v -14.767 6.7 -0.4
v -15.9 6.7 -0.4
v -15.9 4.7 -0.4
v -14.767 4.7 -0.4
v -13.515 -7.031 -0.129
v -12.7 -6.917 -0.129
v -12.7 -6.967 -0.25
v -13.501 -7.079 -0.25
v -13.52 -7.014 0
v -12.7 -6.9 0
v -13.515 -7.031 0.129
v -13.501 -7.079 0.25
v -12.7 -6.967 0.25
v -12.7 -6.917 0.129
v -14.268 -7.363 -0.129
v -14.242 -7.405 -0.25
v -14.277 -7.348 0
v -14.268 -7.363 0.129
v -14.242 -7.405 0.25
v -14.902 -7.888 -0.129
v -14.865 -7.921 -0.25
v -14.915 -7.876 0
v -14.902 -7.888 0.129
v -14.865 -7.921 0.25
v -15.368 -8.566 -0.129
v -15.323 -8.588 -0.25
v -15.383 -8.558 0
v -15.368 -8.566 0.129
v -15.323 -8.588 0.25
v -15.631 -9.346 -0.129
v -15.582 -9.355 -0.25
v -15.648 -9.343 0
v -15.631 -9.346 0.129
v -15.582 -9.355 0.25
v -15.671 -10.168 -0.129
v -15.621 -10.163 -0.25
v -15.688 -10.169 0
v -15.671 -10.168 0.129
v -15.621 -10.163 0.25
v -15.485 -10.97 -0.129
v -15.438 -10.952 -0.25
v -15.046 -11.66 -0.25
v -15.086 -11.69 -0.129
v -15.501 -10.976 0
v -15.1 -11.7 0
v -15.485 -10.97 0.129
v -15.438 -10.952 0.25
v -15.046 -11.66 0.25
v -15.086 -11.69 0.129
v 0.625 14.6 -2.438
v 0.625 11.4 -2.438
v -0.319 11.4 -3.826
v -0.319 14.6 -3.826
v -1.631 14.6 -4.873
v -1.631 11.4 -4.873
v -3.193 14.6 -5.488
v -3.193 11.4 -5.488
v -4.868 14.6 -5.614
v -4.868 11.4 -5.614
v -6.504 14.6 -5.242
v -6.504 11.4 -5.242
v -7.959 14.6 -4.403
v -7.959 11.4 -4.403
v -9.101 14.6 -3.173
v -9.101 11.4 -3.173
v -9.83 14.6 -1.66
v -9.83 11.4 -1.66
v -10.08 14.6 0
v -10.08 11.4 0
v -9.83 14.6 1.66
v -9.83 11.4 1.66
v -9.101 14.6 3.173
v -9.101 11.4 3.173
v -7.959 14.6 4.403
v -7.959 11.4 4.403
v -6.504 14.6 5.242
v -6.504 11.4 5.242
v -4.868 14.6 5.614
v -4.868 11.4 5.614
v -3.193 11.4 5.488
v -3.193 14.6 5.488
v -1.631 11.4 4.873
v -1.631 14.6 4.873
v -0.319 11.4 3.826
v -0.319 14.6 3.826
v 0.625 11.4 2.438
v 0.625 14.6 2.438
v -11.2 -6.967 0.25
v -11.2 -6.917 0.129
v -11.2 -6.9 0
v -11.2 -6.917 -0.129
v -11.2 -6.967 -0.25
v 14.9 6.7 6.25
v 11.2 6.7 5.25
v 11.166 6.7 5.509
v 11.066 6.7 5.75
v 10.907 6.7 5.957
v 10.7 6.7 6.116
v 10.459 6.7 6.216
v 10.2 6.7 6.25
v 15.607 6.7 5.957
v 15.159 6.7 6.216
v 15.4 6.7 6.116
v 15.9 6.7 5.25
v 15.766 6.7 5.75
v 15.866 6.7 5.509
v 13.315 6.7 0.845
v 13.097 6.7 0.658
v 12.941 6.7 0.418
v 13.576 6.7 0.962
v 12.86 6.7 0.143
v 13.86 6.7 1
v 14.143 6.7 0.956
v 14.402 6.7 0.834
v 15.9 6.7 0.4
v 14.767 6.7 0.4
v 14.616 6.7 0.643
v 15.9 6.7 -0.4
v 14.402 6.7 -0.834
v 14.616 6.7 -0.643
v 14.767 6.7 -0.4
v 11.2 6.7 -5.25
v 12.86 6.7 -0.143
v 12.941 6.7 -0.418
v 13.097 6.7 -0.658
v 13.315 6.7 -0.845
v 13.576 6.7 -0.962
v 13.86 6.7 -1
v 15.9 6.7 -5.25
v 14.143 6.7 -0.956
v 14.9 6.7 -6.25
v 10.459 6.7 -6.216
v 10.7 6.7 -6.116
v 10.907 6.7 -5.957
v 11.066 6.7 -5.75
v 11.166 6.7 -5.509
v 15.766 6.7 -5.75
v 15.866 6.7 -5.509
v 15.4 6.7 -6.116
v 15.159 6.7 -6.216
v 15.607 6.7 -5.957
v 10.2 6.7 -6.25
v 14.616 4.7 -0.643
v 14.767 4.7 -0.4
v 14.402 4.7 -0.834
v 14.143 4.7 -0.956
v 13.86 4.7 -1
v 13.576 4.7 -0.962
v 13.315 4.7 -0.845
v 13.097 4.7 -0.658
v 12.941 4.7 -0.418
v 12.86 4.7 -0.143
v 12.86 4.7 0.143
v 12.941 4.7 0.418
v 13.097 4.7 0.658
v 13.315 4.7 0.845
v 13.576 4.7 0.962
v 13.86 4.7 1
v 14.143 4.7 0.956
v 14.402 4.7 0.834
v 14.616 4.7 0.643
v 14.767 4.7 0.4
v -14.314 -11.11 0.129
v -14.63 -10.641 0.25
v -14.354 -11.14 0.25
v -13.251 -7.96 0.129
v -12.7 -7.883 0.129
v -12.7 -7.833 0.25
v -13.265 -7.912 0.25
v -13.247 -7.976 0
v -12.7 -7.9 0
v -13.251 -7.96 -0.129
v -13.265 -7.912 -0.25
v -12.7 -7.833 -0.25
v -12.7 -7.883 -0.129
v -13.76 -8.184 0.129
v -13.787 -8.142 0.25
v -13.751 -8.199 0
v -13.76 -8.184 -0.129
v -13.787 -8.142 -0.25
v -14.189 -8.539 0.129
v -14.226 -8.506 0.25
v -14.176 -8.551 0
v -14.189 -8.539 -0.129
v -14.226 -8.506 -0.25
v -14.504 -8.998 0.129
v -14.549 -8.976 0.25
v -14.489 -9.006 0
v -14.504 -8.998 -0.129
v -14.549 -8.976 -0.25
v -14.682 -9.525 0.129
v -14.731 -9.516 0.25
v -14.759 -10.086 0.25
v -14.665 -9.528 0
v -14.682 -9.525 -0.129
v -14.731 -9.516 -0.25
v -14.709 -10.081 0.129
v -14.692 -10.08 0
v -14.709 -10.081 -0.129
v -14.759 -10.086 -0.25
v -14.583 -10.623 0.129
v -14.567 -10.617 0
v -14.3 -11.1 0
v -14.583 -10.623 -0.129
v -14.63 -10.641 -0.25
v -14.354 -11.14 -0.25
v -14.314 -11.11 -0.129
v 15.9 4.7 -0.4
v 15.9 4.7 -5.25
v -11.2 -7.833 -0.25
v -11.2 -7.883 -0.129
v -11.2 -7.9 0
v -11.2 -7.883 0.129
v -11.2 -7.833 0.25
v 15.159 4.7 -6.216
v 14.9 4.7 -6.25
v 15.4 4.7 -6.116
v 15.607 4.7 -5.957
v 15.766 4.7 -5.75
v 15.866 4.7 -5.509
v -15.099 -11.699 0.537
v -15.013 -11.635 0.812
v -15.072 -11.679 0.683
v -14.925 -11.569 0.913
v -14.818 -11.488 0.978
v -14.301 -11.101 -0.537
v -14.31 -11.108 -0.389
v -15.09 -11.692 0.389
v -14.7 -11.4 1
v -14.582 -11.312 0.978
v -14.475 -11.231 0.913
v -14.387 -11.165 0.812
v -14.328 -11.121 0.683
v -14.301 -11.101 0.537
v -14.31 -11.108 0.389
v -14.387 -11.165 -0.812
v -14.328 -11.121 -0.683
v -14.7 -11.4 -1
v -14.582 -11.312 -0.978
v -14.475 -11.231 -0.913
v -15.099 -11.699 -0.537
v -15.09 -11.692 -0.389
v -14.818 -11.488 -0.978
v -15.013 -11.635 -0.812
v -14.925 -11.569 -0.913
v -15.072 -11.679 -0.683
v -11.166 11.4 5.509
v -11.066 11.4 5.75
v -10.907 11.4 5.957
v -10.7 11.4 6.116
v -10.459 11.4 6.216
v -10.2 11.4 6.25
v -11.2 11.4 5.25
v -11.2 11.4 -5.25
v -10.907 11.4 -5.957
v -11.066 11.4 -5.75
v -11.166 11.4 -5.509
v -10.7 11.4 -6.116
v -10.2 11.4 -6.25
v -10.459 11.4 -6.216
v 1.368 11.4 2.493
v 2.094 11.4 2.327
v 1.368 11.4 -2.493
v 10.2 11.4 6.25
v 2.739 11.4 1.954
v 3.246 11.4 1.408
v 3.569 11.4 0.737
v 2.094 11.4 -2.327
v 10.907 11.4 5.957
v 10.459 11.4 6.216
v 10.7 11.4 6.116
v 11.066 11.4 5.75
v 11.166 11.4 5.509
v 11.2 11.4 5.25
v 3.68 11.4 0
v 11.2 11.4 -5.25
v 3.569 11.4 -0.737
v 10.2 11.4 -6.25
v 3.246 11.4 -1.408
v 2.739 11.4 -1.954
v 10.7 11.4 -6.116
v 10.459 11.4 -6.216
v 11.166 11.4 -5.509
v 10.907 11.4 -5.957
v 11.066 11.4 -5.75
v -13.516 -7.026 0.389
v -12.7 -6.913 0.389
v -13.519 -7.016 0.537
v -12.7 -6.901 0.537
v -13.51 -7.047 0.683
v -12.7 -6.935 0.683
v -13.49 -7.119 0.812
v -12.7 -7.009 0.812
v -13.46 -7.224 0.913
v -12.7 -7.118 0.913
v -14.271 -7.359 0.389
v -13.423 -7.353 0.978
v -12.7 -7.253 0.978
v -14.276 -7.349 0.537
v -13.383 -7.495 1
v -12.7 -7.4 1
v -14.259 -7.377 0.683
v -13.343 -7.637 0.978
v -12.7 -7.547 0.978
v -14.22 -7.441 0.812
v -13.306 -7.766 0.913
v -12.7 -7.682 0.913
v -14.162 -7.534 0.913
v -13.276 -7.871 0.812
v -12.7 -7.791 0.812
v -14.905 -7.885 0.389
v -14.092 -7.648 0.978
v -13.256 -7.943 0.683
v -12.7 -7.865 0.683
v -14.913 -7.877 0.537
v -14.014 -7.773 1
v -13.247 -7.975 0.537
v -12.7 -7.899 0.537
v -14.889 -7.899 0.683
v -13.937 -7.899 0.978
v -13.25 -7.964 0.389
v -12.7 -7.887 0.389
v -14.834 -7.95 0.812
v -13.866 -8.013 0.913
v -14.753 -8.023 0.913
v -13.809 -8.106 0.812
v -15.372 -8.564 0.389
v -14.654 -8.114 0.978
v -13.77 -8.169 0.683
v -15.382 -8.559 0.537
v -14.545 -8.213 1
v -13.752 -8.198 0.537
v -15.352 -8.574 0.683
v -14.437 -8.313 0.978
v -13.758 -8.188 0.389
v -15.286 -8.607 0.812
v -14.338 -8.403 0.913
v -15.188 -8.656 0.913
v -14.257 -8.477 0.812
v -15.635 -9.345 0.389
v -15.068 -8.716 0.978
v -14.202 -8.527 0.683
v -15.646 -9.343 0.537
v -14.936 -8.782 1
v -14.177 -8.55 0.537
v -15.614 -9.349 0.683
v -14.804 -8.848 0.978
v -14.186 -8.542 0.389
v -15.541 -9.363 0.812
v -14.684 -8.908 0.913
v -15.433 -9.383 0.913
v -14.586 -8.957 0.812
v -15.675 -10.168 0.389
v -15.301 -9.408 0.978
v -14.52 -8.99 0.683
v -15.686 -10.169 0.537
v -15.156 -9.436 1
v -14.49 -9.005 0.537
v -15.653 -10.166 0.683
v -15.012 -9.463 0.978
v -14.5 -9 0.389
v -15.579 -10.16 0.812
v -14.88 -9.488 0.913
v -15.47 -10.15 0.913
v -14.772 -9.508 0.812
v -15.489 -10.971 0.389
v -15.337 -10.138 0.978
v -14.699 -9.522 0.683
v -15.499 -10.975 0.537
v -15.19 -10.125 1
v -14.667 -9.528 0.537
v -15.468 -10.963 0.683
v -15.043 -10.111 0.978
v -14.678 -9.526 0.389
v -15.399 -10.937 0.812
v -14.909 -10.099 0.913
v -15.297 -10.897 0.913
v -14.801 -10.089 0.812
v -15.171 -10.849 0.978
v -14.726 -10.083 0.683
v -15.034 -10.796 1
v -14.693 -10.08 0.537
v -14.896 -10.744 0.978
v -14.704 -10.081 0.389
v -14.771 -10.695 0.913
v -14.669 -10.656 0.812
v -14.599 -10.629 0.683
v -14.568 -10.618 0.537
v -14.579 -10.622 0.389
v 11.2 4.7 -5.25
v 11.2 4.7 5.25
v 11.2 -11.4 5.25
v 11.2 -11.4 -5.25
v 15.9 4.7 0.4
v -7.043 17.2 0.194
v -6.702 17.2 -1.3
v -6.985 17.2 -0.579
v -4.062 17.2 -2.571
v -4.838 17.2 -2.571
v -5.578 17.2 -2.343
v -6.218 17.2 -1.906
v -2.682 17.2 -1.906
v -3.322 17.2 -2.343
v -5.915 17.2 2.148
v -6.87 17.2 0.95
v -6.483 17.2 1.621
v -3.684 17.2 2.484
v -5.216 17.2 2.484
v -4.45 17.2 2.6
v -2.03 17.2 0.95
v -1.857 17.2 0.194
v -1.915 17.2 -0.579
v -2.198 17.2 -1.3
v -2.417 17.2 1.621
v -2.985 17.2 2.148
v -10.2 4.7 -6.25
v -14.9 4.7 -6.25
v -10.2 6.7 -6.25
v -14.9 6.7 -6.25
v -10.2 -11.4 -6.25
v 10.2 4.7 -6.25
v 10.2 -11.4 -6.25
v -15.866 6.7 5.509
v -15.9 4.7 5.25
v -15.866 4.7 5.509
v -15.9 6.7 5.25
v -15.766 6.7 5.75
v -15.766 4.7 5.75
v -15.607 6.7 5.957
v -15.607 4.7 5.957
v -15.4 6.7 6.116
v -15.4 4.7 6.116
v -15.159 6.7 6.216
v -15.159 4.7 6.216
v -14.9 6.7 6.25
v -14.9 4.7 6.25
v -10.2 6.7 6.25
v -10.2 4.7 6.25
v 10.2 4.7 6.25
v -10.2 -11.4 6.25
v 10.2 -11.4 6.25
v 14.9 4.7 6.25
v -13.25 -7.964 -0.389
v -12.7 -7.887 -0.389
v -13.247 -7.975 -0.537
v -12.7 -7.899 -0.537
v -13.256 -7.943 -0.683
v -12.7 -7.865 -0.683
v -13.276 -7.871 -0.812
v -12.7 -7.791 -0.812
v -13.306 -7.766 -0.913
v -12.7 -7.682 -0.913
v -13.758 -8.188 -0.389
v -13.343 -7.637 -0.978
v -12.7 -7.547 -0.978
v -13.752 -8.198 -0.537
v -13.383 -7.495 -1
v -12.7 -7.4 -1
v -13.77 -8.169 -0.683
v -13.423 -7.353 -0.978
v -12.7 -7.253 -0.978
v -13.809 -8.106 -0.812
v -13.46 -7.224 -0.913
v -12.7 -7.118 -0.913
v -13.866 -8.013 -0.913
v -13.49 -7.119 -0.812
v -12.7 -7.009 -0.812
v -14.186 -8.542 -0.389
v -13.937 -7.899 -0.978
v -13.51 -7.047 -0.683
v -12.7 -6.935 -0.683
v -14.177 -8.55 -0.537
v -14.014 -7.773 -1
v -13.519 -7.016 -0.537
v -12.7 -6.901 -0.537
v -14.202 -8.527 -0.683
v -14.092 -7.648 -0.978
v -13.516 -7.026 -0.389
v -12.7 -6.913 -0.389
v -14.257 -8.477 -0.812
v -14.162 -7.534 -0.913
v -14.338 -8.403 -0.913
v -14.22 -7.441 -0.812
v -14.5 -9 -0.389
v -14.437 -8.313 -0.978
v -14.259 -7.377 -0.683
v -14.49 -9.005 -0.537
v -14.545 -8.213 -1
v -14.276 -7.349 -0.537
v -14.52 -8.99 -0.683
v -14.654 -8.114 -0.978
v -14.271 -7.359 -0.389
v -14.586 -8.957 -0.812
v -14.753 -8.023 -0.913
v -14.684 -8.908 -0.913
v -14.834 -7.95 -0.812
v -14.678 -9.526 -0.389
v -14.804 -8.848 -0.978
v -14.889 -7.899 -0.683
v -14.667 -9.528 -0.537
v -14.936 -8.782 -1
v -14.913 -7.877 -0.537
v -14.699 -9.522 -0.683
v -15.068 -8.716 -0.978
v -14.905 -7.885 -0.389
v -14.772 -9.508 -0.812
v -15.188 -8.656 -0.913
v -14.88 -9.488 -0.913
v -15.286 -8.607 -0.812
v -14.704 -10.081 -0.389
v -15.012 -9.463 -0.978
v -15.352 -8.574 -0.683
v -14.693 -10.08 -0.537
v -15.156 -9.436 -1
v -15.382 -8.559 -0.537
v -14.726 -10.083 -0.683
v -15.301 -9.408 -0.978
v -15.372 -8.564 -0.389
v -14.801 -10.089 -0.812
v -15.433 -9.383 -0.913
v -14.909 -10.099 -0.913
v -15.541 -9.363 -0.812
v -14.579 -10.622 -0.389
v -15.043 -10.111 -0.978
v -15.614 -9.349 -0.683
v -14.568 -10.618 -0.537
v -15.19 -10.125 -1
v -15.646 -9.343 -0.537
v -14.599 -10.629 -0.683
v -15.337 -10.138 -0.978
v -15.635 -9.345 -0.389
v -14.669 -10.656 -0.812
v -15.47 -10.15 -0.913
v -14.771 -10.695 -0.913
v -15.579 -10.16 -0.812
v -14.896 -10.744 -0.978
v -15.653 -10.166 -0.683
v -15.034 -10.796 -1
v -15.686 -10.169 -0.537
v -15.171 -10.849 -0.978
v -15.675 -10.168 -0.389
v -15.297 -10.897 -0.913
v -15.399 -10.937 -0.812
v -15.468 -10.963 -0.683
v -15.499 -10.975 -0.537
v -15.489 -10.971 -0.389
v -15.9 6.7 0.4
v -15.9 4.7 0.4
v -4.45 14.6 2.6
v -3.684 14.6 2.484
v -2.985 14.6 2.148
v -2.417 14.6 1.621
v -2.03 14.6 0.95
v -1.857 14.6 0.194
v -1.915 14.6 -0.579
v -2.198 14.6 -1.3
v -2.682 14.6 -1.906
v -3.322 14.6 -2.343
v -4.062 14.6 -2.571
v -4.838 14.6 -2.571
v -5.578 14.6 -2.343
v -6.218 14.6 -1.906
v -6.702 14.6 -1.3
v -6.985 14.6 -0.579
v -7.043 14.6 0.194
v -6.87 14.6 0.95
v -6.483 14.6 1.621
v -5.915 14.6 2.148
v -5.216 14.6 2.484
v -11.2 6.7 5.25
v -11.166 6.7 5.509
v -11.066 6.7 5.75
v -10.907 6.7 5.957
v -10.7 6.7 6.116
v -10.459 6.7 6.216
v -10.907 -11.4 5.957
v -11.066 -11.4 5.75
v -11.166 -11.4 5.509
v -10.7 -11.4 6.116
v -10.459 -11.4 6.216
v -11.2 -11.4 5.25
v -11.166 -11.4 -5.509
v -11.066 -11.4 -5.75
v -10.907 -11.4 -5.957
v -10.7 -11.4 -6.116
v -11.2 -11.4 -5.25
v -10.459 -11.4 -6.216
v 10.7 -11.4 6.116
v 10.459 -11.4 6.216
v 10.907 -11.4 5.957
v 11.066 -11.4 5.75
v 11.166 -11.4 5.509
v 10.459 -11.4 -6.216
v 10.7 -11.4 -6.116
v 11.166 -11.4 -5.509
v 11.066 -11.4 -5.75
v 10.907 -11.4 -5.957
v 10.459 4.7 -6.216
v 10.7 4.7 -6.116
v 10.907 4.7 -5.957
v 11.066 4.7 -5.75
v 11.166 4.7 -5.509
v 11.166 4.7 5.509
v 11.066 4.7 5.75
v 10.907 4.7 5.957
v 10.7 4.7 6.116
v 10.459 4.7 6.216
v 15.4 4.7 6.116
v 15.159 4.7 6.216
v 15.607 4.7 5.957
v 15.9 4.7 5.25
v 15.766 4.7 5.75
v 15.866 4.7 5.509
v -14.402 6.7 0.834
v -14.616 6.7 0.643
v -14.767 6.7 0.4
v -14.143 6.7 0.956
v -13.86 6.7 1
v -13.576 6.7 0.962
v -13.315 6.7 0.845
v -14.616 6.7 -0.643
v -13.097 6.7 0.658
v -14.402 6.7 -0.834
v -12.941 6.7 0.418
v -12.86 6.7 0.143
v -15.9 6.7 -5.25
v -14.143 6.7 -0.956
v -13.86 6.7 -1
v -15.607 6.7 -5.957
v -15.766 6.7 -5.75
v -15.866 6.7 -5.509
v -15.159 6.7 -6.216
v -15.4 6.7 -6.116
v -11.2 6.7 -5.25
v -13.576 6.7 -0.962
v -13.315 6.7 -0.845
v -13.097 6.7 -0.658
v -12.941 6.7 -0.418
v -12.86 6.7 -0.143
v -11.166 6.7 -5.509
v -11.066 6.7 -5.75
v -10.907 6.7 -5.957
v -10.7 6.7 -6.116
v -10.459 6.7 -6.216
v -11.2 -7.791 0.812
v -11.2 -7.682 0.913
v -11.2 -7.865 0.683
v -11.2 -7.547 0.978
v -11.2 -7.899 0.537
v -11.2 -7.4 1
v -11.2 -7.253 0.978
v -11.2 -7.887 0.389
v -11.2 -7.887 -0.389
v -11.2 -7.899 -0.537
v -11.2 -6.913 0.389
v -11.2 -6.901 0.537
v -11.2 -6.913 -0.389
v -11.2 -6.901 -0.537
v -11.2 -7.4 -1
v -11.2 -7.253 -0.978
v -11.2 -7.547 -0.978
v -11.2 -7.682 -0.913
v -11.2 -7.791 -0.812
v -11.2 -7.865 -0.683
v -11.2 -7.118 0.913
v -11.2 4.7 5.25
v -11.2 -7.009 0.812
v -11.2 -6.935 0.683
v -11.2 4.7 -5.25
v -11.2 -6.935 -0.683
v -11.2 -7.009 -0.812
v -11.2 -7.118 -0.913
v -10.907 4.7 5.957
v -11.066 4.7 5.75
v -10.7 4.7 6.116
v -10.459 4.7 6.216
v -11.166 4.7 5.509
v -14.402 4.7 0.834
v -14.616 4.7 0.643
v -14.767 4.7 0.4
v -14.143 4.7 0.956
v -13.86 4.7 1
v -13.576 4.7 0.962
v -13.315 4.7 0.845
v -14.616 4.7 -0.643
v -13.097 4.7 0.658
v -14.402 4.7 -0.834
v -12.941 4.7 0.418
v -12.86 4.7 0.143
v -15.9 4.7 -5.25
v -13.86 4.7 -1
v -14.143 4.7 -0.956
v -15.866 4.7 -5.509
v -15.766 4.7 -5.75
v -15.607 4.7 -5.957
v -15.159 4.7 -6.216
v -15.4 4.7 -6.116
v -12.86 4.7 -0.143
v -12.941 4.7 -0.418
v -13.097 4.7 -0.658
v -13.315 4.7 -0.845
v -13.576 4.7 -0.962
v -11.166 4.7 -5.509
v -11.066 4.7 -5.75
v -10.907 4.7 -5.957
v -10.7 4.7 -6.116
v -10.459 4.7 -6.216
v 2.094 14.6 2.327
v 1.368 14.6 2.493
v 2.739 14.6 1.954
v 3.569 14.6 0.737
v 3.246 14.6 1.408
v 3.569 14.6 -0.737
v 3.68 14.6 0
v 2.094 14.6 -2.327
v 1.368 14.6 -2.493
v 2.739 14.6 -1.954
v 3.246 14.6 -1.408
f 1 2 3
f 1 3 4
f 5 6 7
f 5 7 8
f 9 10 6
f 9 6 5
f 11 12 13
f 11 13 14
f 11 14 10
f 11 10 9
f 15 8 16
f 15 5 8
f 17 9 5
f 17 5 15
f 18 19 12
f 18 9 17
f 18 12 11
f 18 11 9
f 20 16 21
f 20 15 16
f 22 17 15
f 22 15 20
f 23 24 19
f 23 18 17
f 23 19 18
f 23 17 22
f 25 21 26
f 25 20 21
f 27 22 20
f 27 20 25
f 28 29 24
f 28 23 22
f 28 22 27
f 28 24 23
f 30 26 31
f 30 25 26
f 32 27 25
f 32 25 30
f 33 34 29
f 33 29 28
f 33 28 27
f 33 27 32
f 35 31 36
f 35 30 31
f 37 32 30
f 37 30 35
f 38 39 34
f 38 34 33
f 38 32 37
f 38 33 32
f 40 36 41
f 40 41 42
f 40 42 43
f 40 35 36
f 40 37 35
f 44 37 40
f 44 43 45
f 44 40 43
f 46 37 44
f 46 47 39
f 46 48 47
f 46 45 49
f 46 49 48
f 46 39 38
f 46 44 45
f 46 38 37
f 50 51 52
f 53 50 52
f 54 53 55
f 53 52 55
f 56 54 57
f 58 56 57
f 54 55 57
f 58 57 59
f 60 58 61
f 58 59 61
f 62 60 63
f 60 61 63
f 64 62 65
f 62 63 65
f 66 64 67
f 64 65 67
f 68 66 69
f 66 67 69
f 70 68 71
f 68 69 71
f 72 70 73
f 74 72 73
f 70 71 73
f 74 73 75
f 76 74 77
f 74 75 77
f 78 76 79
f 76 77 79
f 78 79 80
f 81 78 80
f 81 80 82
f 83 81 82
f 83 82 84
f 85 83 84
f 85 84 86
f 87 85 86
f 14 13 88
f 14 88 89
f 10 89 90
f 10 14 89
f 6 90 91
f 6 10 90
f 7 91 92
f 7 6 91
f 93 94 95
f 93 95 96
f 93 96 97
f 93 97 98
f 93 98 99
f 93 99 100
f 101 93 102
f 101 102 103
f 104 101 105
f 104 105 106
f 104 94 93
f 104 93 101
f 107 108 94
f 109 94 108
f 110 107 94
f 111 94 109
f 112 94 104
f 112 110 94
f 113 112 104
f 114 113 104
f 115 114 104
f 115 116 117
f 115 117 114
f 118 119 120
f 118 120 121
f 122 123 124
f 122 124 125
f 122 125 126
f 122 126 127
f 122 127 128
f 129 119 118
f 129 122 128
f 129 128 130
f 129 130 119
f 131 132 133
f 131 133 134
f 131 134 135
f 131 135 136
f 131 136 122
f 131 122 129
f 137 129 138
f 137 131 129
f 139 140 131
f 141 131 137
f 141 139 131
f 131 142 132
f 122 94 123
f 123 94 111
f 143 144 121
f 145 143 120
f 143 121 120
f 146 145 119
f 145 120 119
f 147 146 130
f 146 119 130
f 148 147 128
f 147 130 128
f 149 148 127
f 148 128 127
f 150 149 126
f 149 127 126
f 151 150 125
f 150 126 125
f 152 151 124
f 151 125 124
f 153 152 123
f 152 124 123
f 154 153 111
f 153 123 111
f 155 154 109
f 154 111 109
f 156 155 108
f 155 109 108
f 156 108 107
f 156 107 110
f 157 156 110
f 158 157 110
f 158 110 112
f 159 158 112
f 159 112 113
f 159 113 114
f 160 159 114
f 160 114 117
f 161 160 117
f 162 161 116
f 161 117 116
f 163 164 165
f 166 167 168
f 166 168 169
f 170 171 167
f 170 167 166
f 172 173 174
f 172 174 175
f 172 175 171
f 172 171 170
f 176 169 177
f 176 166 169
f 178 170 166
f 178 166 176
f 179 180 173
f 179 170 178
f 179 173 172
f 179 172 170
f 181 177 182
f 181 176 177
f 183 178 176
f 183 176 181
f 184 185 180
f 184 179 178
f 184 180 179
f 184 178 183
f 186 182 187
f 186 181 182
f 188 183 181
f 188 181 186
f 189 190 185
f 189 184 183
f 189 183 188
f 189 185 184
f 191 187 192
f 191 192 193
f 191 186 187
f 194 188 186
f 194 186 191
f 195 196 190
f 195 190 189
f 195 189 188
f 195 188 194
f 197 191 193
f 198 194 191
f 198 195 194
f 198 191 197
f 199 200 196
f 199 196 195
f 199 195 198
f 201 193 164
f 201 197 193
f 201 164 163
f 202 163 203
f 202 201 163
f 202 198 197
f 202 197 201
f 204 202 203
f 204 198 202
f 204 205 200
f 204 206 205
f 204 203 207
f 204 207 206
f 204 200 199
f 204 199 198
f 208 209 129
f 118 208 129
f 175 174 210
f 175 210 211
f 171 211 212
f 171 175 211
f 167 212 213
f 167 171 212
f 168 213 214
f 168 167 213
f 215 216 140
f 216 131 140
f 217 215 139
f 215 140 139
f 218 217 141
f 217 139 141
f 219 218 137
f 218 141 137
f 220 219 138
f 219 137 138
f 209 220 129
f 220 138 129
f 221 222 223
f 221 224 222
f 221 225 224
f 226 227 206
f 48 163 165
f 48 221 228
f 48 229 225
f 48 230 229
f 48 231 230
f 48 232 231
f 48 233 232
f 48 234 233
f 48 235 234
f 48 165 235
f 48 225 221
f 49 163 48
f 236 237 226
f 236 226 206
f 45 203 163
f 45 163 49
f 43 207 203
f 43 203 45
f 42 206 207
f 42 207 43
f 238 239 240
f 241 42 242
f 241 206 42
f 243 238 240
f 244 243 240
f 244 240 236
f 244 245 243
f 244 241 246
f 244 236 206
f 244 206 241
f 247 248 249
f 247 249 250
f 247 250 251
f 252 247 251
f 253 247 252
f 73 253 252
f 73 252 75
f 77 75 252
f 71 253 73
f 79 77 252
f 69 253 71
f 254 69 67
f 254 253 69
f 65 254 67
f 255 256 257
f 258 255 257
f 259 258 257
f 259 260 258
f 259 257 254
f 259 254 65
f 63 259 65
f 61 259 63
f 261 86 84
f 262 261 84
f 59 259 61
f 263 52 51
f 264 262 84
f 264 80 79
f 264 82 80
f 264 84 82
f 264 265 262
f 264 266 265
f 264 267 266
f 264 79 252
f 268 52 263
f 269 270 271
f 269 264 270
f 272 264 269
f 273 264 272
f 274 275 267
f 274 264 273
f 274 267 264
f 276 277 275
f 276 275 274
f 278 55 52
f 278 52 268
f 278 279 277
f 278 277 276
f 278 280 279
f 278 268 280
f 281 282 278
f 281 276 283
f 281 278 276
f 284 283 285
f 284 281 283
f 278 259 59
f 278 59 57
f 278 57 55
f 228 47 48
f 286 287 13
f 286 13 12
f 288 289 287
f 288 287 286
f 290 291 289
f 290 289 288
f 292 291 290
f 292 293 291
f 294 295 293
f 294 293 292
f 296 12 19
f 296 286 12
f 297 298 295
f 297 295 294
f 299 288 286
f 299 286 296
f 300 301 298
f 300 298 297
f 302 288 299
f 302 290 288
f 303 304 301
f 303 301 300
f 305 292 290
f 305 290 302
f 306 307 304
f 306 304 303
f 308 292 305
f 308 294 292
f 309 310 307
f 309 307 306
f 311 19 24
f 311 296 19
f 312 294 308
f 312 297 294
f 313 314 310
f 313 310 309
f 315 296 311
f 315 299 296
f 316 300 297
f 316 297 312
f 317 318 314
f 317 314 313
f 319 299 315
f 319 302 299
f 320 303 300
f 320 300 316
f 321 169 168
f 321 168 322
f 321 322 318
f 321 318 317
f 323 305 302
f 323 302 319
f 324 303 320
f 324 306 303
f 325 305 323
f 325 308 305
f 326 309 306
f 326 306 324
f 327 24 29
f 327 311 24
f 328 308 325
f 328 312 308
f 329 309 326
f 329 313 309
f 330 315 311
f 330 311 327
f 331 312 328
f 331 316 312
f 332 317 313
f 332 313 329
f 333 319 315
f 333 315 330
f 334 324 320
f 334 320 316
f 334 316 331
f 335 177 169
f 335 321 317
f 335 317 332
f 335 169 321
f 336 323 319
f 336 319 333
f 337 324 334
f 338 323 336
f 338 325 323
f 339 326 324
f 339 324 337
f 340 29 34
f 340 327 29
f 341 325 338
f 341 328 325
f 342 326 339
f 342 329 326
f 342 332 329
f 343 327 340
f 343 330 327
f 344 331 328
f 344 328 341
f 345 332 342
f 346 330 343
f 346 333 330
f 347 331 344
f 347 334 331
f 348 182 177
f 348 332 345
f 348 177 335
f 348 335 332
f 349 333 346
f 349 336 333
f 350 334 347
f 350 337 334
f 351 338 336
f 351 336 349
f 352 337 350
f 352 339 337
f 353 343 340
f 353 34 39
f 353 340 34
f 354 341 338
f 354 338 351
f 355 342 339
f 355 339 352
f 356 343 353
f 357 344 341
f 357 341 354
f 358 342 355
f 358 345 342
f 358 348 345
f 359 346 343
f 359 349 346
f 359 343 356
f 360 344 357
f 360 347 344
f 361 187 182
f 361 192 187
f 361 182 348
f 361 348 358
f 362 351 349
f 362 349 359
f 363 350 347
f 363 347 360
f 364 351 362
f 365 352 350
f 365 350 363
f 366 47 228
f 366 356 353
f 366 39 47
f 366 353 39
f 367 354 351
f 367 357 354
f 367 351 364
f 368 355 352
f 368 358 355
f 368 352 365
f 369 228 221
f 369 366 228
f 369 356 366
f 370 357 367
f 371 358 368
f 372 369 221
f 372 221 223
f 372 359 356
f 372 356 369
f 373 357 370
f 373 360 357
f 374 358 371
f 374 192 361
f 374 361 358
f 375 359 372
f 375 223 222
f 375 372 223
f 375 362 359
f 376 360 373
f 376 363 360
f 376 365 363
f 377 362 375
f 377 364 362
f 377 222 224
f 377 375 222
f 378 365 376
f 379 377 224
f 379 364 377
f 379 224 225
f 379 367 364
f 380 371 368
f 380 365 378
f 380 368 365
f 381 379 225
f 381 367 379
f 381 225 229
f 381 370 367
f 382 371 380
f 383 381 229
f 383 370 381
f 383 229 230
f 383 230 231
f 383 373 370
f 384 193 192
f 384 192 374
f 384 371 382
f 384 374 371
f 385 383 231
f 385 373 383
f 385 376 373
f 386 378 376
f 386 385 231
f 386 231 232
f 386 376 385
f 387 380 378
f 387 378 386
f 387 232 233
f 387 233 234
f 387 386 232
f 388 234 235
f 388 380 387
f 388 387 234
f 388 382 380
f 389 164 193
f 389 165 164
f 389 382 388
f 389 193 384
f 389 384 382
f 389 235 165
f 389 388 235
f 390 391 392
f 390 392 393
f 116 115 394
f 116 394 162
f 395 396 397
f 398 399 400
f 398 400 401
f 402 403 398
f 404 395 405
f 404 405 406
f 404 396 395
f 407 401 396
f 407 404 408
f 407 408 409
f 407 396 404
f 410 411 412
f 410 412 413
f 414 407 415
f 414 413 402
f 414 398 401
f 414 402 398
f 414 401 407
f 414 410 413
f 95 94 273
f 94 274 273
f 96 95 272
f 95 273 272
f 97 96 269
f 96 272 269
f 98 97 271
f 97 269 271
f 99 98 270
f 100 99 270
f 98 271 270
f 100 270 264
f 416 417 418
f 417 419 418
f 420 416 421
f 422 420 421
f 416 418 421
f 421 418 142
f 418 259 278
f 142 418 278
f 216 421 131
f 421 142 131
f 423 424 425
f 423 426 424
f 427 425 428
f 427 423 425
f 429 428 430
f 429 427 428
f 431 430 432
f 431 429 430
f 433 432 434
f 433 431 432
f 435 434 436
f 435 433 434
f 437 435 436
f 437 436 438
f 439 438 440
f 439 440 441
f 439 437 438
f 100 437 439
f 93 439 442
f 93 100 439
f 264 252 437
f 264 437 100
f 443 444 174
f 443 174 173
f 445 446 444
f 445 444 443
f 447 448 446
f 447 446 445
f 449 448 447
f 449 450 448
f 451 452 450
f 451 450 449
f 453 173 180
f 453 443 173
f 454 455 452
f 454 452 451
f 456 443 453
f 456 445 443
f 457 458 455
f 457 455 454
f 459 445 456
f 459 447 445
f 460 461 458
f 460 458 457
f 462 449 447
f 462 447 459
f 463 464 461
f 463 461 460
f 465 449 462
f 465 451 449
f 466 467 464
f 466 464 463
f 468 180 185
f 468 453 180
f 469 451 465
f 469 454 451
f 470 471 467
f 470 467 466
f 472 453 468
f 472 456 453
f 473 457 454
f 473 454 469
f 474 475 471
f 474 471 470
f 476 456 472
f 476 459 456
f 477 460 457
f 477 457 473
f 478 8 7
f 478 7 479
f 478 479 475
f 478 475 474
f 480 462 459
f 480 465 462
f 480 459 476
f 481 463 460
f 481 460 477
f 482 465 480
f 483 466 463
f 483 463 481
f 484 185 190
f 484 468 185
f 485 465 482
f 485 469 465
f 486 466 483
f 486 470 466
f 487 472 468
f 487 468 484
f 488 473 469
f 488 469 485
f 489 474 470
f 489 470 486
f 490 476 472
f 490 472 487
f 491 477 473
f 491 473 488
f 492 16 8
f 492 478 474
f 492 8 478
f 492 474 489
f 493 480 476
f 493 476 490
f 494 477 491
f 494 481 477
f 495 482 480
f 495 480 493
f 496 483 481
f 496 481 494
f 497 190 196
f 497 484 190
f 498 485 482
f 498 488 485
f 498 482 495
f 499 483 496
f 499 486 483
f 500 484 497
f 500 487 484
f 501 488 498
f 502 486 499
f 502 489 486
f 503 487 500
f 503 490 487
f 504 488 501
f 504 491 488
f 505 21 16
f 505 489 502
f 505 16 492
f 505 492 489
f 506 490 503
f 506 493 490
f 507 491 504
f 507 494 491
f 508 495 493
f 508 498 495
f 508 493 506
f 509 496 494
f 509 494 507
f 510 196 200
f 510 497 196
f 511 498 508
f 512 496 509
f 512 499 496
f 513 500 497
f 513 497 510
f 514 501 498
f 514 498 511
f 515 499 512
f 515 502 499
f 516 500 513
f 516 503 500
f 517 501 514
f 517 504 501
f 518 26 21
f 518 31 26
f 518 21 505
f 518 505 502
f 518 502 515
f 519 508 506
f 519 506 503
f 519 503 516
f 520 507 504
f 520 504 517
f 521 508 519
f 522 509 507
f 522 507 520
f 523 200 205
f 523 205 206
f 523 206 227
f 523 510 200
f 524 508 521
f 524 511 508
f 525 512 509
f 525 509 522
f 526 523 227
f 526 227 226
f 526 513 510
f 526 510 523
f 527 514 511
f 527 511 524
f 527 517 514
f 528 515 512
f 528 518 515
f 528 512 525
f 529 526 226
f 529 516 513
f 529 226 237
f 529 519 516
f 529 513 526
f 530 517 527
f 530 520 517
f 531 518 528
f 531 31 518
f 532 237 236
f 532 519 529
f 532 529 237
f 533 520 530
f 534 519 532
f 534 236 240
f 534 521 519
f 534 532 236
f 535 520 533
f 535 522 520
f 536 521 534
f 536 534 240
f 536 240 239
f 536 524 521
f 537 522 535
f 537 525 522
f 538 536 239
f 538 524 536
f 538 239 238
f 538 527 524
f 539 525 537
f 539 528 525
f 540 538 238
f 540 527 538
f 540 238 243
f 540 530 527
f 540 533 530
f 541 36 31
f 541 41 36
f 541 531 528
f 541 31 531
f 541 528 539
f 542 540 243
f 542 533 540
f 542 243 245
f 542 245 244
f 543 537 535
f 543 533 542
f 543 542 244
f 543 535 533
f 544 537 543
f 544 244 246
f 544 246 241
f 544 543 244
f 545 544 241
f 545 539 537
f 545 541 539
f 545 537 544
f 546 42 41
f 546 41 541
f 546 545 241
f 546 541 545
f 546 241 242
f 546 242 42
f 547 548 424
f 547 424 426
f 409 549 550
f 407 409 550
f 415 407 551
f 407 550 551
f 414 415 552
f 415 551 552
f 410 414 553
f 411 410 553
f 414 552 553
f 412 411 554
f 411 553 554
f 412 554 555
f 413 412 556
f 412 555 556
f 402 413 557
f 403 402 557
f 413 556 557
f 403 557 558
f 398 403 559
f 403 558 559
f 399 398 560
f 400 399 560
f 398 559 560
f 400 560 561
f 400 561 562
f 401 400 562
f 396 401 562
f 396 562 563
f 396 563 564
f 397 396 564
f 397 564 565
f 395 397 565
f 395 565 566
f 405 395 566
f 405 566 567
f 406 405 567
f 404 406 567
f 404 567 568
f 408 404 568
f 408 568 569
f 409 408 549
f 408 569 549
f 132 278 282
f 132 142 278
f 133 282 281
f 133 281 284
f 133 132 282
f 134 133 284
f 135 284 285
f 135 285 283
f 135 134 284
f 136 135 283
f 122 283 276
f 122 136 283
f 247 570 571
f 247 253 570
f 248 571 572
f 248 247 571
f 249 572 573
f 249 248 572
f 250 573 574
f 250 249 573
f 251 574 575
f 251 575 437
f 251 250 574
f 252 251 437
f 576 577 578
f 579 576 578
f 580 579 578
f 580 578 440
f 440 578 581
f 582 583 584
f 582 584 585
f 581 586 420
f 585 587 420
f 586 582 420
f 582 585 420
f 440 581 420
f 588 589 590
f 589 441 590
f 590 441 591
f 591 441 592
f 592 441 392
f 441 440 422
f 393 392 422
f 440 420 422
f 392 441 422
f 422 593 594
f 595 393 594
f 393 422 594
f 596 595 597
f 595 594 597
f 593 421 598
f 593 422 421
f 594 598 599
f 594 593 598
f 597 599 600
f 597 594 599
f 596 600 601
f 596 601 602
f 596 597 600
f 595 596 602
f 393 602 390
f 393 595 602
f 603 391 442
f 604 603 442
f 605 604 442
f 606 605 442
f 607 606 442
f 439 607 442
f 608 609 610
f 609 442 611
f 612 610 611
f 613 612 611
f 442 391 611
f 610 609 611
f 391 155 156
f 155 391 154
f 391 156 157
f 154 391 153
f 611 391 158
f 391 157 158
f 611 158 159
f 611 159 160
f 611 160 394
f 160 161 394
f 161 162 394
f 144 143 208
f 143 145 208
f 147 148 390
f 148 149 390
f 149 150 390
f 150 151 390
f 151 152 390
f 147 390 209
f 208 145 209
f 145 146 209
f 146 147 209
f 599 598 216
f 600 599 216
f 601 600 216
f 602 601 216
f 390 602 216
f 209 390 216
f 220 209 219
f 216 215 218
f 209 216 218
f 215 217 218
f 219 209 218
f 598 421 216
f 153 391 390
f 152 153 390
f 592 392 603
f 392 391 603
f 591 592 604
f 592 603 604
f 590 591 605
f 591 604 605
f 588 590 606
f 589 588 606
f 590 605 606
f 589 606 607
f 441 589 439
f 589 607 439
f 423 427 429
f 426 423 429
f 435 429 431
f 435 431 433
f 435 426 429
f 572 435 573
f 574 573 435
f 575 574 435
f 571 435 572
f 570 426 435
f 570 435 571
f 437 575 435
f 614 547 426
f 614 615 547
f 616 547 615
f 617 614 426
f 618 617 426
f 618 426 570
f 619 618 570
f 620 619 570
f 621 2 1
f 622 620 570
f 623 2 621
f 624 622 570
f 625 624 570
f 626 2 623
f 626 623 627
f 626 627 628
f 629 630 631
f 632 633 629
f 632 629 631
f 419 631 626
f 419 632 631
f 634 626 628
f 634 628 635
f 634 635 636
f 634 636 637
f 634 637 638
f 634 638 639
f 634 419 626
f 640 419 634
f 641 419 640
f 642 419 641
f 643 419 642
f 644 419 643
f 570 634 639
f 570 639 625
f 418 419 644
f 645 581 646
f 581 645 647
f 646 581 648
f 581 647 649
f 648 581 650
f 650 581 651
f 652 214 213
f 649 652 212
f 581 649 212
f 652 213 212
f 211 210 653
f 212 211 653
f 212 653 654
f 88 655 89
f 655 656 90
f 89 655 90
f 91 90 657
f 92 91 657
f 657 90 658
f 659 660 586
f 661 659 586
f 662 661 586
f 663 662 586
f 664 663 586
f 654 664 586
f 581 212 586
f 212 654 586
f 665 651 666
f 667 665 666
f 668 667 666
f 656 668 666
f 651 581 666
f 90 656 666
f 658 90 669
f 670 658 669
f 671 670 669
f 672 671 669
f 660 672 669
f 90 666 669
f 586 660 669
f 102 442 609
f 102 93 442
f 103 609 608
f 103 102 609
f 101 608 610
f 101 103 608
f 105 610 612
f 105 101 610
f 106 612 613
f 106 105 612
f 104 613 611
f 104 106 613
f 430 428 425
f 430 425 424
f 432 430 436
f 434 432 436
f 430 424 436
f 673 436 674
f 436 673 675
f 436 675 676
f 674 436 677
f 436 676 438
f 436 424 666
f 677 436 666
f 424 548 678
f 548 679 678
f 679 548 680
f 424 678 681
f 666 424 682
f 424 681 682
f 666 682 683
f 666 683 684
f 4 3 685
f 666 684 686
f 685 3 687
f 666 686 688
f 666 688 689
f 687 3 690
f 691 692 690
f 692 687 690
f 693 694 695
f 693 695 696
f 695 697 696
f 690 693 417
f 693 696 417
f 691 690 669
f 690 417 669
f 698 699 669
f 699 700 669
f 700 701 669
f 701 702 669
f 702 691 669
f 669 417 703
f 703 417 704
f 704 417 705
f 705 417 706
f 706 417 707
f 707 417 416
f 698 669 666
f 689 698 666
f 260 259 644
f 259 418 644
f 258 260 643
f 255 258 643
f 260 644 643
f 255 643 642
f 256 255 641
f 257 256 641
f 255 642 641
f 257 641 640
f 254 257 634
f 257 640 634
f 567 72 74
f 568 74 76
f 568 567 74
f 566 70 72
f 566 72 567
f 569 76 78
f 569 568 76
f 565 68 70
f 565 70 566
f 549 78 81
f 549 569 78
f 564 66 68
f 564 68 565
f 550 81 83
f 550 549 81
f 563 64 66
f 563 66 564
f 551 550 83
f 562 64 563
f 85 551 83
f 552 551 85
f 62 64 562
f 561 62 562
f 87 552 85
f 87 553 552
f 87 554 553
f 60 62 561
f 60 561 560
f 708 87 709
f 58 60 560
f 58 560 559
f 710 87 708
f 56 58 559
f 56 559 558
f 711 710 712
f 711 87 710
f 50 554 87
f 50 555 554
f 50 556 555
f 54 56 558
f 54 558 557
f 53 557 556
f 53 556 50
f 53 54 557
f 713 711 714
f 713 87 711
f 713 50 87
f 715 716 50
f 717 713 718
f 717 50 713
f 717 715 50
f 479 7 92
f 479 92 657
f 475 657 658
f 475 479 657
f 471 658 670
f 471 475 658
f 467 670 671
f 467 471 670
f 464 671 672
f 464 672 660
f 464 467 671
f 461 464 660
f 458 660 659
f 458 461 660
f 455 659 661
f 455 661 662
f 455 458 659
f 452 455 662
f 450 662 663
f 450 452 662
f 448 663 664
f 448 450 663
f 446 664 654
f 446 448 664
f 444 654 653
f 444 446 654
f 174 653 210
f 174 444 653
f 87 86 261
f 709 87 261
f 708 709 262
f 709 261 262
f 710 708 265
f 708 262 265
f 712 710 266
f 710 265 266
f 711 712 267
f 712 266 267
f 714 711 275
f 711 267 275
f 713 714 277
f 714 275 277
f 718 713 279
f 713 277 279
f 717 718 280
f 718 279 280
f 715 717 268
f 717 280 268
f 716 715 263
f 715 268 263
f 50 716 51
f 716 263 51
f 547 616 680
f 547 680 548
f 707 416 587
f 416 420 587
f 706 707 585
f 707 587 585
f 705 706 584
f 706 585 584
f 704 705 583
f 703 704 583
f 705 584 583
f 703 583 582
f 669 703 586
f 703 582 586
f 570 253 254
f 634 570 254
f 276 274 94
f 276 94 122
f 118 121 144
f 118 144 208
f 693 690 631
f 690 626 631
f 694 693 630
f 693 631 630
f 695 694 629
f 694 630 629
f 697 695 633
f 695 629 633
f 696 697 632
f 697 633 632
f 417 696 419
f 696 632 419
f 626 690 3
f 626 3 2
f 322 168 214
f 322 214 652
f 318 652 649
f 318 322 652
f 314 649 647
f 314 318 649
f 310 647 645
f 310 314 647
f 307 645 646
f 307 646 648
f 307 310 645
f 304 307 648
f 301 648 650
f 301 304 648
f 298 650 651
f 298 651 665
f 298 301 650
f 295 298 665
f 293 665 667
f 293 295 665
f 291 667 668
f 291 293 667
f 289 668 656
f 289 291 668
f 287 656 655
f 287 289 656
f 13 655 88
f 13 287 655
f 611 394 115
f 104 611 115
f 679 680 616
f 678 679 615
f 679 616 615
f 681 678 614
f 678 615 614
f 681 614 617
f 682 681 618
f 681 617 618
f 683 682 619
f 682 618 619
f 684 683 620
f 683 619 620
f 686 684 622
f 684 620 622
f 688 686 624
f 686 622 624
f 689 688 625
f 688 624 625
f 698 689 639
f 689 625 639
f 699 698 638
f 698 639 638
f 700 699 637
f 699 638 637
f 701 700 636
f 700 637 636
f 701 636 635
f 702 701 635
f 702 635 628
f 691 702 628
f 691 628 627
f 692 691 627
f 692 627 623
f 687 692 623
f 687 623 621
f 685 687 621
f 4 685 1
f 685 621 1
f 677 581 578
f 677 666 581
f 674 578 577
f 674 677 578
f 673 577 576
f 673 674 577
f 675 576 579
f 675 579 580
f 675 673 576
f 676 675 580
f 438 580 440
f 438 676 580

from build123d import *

# Parameters (mm, degrees)
SKETCH1_W                = 22.4
SKETCH1_H                = 12.5
BOSS_EXTRUDE1_DEPTH      = 11.4
SKETCH2_R                = 5.63
SKETCH2_R_2              = 2.5
BOSS_EXTRUDE2_DEPTH      = 3.2
BOSS_EXTRUDE3_DEPTH      = 6.25
BOSS_EXTRUDE3_DEPTH_BACK = 6.25
SKETCH3_W                = 31.8
SKETCH3_H                = 2
SKETCH4_R                = 1
CUT_EXTRUDE1_DEPTH       = 25.889405377
CUT_EXTRUDE2_DEPTH       = 25.889405377
SKETCH6_R                = 2.6
BOSS_EXTRUDE4_DEPTH      = 2.6
FILLET1_R                = 1


with BuildPart() as part:
    # Sketch1 → Boss-Extrude1 (new, symmetric)
    with BuildSketch(Plane(origin=(0, 0, 0), x_dir=(1, 0, 0), z_dir=(0, 1, 0))):
        Rectangle(SKETCH1_W, SKETCH1_H)
    extrude(amount=BOSS_EXTRUDE1_DEPTH, both=True)

    # Sketch2 → Boss-Extrude2 (add)
    with BuildSketch(Plane(origin=(0, 11.4, 0), x_dir=(1, 0, 0), z_dir=(0, 1, 0))):
        with Locations((-4.45, 0)):
            Circle(SKETCH2_R)
        with Locations((1.18, 0)):
            Circle(SKETCH2_R_2)
    extrude(amount=BOSS_EXTRUDE2_DEPTH)

    # Sketch3 → Boss-Extrude3 (add, two sides: drawn at the far end of the back side and taken through both)
    with BuildSketch(Plane.XY.offset(-BOSS_EXTRUDE3_DEPTH_BACK)):
        with Locations((0, 5.7)):
            Rectangle(SKETCH3_W, SKETCH3_H)
    extrude(amount=BOSS_EXTRUDE3_DEPTH + BOSS_EXTRUDE3_DEPTH_BACK)

    # Sketch4 → Cut-Extrude1 (cut, through all)
    with BuildSketch(Plane(origin=(0, 6.7, 0), x_dir=(1, 0, 0), z_dir=(0, 1, 0))):
        with Locations(Location((-13.85, 0, 0), (0, 0, 270))):
            Circle(SKETCH4_R)
        with Locations(Location((13.85, 0, 0), (0, 0, 270))):
            Circle(SKETCH4_R)
    extrude(amount=-CUT_EXTRUDE1_DEPTH, mode=Mode.SUBTRACT)

    # Sketch5 → Cut-Extrude2 (cut, through all)
    with BuildSketch(Plane(origin=(0, 6.7, 0), x_dir=(1, 0, 0), z_dir=(0, 1, 0))):
        with BuildLine():
            Line((-17.95, 0.4), (-13.85, 0.4))
            ThreePointArc((-13.85, 0.4), (-13.45, 0), (-13.85, -0.4))
            Line((-13.85, -0.4), (-17.95, -0.4))
            ThreePointArc((-17.95, -0.4), (-18.35, 0), (-17.95, 0.4))
        make_face()
        with BuildLine():
            Line((17.95, -0.4), (13.85, -0.4))
            ThreePointArc((13.85, -0.4), (13.45, 0), (13.85, 0.4))
            Line((13.85, 0.4), (17.95, 0.4))
            ThreePointArc((17.95, 0.4), (18.35, 0), (17.95, -0.4))
        make_face()
    extrude(amount=-CUT_EXTRUDE2_DEPTH, mode=Mode.SUBTRACT)

    # Sketch6 → Boss-Extrude4 (add)
    with BuildSketch(Plane(origin=(0, 14.6, 0), x_dir=(1, 0, 0), z_dir=(0, 1, 0))):
        with Locations(Location((-4.45, 0, 0), (0, 0, 270))):
            Circle(SKETCH6_R)
    extrude(amount=BOSS_EXTRUDE4_DEPTH)

    # Fillet1
    fillet1_edges = [part.edges().sort_by_distance(p)[0] for p in [
        (11.2, -3.35, 6.25),
        (-11.2, -3.35, 6.25),
        (-11.2, -3.35, -6.25),
        (11.2, -3.35, -6.25),
        (15.9, 5.7, 6.25),
        (-15.9, 5.7, 6.25),
        (-15.9, 5.7, -6.25),
        (15.9, 5.7, -6.25),
        (11.2, 9.05, 6.25),
        (-11.2, 9.05, 6.25),
        (-11.2, 9.05, -6.25),
        (11.2, 9.05, -6.25),
    ]]
    fillet(fillet1_edges, radius=FILLET1_R)

    # Sweep1: sweep along a path in Sketch8
    with BuildLine(Plane.XY) as sweep1_path:
        Line((-11.2, -7.4), (-12.7, -7.4))
        ThreePointArc((-12.7, -7.4), (-14.936067977, -8.781966011), (-14.7, -11.4))
    # Sketch7 → Sweep1 (sweep)
    with BuildSketch(Plane.ZY.offset(11.2)):
        with BuildLine():
            ThreePointArc((0.25, -6.966987298), (0, -6.9), (-0.25, -6.966987298))
            ThreePointArc((-0.25, -6.966987298), (-1, -7.4), (-0.25, -7.833012702))
            ThreePointArc((-0.25, -7.833012702), (0, -7.9), (0.25, -7.833012702))
            ThreePointArc((0.25, -7.833012702), (1, -7.4), (0.25, -6.966987298))
        make_face()
    sweep(path=sweep1_path.line)


solid = part.part
